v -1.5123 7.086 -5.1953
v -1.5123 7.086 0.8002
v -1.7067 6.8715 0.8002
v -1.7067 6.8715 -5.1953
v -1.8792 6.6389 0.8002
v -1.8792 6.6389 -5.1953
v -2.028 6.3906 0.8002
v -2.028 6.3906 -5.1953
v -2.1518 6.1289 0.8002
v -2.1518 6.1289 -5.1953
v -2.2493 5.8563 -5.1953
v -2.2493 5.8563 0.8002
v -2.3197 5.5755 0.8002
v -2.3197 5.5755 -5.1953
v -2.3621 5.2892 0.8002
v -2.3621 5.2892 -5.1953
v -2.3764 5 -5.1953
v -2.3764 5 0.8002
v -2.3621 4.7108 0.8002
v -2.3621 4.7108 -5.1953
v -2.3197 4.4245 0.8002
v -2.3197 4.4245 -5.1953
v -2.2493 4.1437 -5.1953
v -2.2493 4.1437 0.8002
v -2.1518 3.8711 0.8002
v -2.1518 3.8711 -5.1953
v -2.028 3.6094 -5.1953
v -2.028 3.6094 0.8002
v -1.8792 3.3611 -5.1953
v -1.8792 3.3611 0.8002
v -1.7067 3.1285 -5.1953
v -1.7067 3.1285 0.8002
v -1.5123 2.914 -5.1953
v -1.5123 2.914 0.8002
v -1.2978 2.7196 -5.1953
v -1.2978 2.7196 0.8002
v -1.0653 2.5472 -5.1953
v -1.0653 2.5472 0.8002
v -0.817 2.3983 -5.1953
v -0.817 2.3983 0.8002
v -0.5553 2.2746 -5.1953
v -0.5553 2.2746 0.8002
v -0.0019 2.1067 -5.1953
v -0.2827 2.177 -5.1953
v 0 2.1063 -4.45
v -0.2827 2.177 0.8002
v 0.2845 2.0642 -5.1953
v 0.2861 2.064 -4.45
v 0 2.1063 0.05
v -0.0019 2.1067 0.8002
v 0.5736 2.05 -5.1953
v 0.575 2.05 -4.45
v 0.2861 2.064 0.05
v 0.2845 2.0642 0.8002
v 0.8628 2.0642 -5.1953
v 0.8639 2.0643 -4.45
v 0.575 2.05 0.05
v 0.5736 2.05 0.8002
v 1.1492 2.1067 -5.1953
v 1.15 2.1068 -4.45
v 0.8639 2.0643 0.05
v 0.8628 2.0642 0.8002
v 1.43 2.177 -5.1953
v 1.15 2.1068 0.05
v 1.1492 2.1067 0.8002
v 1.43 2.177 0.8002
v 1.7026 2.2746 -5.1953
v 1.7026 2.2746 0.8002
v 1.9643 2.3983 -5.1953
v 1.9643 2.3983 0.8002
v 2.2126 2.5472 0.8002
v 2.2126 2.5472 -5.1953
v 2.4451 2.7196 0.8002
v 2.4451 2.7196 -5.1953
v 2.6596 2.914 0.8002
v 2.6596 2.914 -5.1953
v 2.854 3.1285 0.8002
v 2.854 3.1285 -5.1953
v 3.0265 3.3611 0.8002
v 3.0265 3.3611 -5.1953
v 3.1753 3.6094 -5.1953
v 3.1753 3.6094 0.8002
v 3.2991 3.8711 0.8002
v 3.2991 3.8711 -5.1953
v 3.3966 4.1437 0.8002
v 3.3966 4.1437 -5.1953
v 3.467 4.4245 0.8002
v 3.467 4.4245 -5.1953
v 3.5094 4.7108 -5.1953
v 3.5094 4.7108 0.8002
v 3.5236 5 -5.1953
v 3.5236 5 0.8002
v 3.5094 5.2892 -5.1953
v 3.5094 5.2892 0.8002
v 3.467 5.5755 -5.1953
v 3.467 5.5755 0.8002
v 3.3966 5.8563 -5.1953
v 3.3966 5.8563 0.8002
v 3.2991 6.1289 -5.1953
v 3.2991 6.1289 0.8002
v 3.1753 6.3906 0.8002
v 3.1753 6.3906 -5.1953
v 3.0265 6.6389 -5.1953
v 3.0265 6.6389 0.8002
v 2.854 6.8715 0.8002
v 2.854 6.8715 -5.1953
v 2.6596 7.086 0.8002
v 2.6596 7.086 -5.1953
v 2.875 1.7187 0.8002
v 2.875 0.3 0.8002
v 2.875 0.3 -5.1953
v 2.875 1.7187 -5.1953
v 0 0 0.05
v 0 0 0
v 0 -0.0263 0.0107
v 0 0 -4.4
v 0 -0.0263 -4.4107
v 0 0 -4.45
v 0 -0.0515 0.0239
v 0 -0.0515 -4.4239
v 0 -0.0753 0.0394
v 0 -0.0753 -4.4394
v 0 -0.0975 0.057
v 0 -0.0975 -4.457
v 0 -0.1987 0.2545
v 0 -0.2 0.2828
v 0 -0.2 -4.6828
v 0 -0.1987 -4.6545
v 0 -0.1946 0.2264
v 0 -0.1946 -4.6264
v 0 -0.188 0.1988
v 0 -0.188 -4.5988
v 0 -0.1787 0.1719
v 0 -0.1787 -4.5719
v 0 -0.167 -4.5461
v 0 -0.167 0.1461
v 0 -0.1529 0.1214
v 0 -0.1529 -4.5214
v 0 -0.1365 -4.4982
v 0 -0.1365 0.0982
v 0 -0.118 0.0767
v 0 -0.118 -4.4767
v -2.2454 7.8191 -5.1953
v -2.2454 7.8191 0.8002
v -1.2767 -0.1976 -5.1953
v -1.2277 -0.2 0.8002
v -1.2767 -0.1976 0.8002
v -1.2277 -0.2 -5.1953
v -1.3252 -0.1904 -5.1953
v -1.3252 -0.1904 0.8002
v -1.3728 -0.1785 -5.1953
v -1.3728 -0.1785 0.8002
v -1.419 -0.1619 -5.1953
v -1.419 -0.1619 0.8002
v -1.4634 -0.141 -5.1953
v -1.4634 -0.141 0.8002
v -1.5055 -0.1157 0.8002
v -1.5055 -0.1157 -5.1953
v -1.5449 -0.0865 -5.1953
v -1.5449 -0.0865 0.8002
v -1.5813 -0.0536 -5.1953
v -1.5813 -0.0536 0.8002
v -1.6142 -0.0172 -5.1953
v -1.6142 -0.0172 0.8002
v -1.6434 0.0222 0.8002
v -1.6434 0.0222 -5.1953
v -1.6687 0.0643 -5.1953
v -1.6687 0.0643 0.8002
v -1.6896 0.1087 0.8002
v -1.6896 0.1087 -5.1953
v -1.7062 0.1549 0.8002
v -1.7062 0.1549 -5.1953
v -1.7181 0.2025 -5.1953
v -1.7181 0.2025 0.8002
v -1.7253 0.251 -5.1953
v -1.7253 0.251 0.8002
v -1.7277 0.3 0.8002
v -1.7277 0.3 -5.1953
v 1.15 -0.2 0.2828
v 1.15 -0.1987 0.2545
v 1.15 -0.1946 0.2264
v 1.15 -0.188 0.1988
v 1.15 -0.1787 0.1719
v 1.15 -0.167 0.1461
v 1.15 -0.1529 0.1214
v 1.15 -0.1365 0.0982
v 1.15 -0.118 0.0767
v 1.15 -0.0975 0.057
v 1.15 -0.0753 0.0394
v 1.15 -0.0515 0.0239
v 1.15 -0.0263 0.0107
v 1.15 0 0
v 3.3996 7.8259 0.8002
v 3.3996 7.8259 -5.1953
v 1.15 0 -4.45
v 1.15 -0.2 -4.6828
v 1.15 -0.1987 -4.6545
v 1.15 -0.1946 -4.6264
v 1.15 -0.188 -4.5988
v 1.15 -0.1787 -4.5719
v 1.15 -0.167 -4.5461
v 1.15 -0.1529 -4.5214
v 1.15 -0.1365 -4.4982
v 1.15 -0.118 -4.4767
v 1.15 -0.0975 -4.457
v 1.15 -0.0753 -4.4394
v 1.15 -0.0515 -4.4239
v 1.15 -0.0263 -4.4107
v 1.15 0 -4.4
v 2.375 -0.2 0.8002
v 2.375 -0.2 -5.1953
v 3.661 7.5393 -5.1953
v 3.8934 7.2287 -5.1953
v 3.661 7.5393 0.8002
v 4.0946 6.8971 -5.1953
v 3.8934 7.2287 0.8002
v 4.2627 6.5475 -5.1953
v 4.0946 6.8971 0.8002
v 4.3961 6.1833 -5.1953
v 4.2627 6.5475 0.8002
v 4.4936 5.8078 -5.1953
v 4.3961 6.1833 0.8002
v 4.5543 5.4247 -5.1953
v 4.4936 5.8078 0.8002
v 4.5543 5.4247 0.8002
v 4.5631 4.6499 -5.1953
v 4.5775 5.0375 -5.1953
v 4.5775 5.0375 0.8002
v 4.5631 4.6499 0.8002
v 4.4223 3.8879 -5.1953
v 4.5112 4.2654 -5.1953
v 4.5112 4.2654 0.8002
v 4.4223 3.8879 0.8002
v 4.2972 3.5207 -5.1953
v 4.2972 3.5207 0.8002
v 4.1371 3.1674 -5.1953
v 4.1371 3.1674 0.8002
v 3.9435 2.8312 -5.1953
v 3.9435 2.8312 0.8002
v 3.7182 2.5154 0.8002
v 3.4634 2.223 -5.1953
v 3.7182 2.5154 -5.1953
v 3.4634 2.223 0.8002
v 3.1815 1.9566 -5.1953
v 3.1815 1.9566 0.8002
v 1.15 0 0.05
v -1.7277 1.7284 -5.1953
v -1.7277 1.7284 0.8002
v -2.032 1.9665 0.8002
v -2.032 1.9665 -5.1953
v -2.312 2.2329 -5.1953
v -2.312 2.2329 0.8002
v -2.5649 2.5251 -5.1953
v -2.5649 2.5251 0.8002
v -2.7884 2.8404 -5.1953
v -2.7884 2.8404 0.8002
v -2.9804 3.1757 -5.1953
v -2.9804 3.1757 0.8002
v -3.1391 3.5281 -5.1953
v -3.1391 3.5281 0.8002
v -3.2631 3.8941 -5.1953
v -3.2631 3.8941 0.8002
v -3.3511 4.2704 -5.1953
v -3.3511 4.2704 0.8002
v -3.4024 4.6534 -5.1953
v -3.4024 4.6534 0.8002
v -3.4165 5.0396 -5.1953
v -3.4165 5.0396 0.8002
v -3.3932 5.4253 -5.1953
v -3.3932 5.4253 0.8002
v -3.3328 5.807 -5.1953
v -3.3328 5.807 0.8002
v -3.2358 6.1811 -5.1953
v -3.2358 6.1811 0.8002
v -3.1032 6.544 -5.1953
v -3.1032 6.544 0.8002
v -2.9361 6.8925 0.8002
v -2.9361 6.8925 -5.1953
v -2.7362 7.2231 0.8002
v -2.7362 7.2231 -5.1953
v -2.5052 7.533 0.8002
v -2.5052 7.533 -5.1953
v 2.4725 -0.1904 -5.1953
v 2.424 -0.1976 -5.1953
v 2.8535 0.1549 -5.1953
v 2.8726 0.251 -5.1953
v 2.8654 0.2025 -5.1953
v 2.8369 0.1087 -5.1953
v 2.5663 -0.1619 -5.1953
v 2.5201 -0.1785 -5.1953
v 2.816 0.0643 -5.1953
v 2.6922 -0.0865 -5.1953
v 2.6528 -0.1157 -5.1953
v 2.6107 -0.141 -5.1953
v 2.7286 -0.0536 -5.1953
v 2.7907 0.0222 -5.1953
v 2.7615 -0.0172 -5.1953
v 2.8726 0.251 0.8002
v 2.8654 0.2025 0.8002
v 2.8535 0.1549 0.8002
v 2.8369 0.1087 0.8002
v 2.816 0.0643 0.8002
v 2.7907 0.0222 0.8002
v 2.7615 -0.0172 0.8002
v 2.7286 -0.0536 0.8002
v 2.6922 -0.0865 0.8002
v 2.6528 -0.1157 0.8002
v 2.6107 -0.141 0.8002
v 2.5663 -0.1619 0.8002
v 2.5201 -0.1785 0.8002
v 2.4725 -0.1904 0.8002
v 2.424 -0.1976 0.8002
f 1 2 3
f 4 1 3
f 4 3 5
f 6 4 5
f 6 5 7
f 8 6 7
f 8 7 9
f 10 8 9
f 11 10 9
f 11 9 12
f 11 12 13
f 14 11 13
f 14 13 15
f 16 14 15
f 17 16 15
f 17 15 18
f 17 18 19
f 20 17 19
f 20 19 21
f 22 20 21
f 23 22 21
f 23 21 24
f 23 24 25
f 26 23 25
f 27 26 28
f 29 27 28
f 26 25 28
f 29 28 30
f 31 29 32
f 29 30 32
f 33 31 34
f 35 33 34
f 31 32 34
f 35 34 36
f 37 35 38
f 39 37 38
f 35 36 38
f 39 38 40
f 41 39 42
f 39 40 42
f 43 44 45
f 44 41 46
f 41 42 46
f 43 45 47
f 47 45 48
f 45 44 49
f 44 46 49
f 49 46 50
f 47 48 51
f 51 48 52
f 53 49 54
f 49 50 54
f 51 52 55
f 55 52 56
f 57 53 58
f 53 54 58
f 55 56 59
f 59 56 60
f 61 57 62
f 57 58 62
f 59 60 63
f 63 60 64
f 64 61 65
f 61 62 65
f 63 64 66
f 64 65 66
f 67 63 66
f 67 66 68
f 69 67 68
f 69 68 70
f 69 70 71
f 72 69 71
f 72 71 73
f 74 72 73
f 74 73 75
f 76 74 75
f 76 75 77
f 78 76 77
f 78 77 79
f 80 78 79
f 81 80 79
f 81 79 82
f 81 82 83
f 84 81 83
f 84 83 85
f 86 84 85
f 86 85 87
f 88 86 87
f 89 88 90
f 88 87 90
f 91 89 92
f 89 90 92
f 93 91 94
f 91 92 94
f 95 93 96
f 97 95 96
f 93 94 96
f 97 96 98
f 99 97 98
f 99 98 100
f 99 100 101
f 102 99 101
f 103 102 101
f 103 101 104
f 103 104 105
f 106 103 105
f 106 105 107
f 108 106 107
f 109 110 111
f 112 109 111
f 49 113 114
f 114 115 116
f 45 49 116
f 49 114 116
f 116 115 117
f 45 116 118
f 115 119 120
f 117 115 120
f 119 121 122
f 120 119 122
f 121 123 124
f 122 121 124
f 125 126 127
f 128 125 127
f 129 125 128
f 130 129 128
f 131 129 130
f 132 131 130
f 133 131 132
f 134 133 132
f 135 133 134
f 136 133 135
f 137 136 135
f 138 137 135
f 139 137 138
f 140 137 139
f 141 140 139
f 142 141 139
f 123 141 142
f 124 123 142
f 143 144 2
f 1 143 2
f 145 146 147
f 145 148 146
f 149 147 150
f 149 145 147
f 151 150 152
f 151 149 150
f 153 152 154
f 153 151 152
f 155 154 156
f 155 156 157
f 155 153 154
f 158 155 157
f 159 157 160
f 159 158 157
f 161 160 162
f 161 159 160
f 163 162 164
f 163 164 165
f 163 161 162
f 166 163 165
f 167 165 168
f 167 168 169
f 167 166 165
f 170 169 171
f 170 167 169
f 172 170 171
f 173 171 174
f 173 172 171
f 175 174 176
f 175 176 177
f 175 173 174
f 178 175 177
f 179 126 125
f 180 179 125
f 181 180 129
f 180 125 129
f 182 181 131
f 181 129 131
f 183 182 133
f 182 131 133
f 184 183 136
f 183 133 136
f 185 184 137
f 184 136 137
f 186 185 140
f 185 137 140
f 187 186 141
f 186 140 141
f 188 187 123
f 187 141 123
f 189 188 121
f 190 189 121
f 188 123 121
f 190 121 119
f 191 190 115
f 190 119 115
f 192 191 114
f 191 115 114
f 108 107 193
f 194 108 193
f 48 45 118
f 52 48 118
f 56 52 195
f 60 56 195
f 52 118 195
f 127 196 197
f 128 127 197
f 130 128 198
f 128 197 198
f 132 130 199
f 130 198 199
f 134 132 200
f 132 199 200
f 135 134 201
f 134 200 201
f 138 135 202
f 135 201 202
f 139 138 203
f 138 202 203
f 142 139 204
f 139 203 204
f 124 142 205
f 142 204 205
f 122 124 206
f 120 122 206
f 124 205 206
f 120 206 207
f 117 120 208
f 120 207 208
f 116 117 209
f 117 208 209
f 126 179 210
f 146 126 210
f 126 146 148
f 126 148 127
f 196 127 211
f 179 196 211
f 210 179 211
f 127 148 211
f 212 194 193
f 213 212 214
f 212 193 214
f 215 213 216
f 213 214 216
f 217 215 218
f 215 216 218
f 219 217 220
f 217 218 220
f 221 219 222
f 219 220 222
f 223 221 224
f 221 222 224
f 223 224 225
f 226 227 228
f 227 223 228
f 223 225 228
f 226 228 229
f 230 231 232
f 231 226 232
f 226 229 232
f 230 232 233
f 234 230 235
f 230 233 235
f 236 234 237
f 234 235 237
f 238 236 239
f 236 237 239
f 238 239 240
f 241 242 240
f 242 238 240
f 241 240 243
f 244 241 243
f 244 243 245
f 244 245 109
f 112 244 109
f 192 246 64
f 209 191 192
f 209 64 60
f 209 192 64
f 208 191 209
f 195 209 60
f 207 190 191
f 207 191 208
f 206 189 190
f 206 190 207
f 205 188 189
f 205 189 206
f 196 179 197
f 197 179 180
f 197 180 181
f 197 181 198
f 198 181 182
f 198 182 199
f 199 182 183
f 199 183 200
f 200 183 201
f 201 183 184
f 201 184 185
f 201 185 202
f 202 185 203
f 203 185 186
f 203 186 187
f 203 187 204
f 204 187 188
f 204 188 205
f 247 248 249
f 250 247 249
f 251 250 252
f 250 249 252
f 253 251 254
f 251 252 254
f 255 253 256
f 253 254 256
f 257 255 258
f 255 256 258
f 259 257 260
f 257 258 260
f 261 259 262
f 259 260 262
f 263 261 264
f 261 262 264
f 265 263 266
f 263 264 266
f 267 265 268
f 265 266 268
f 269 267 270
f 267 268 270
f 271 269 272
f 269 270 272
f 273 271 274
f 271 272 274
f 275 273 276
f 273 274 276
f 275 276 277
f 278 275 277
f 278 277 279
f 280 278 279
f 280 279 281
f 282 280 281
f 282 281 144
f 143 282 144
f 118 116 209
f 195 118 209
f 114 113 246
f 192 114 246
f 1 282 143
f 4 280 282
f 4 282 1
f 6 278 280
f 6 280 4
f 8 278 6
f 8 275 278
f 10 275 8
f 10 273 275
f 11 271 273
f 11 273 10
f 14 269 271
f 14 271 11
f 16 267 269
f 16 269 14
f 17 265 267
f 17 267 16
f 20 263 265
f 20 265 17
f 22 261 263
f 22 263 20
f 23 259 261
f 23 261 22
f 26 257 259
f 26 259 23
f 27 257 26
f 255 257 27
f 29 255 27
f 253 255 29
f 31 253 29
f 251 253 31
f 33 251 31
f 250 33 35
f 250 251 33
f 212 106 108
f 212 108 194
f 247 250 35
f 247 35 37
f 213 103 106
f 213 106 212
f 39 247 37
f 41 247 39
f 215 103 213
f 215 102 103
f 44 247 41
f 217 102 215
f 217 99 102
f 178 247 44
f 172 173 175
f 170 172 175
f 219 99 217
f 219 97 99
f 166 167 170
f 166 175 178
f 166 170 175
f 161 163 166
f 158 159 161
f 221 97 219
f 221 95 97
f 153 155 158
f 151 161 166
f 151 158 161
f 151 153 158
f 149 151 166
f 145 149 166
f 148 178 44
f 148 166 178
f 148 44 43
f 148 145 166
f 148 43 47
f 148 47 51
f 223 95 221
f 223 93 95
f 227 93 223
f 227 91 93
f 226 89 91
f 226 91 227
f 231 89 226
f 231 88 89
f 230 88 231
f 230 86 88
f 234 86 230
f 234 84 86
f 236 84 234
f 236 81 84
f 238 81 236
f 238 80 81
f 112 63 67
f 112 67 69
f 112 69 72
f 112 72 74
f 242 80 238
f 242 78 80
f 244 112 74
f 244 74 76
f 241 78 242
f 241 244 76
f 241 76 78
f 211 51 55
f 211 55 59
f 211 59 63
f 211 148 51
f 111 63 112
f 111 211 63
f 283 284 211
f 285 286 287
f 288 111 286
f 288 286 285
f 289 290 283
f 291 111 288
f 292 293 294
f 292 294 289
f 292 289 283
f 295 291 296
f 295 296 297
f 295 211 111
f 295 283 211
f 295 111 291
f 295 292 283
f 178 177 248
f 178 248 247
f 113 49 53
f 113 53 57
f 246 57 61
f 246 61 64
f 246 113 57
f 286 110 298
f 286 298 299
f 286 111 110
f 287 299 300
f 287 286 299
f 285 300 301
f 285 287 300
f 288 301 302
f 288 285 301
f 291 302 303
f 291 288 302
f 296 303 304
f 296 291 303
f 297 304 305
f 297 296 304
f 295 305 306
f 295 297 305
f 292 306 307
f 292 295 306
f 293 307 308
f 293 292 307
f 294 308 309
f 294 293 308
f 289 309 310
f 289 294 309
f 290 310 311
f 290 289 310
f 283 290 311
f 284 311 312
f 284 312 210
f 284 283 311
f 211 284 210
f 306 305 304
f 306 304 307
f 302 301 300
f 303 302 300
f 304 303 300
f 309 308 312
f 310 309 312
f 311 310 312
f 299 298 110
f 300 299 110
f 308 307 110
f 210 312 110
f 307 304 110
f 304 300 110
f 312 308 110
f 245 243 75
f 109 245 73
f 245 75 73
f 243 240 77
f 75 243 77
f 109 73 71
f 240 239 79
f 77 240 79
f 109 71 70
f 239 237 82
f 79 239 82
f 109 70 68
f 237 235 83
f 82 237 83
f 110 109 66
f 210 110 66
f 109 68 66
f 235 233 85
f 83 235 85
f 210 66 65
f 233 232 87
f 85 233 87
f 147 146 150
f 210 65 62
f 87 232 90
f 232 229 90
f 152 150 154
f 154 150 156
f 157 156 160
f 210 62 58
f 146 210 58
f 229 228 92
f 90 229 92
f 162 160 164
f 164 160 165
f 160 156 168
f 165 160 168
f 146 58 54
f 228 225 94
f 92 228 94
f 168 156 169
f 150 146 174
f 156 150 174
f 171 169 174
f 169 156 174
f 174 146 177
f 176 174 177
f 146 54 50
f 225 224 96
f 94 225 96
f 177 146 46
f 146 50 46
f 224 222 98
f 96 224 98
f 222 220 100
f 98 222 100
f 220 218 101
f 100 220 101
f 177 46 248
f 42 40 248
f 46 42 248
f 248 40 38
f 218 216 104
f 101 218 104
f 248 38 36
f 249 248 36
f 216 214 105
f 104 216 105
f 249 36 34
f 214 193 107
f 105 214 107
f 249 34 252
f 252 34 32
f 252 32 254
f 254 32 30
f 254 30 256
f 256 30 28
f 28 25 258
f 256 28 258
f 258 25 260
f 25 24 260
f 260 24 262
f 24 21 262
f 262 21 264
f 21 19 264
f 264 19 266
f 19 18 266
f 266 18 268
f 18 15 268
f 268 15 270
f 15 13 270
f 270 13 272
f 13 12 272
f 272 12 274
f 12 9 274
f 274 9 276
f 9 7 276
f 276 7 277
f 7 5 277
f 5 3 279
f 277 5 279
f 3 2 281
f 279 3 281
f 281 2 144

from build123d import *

# Parameters (mm, degrees)
BOSS_EXTRUDE1_DEPTH      = 2
BOSS_EXTRUDE1_DEPTH_BACK = 0.2
SKETCH1_W                = 4.602701487
SKETCH1_H                = 5.995472756
SKETCH1_W_2              = 1.15
SKETCH1_H_2              = 4.4
BOSS_EXTRUDE2_REACH      = 8.943
SKETCH4_W                = 1.15
SKETCH4_H                = 4.5
CUT_EXTRUDE2_DEPTH       = 2.2
FILLET1_R                = 0.5
FILLET2_R                = 0.3


with BuildPart() as part:
    # Sketch1 → Boss-Extrude1 (new, two sides: drawn at the far end of the back side and taken through both)
    with BuildSketch(Plane(origin=(0, 0, 0), x_dir=(1, 0, 0), z_dir=(0, 1, 0)).offset(-BOSS_EXTRUDE1_DEPTH_BACK)):
        with Locations((0.573649256, 2.197554863)):
            Rectangle(SKETCH1_W, SKETCH1_H)
        with Locations((0.575, 2.2)):
            Rectangle(SKETCH1_W_2, SKETCH1_H_2, mode=Mode.SUBTRACT)
    extrude(amount=BOSS_EXTRUDE1_DEPTH + BOSS_EXTRUDE1_DEPTH_BACK)

    # Boss-Extrude2: up to this face of the body (flat: up to its plane)
    boss_extrude2_end = Plane(part.part.faces().sort_by_distance((0.573649257, 0.9, -5.195291241))[0])
    # Sketch3 → Boss-Extrude2 (add, up to the picked face)
    with BuildSketch(Plane.XY.offset(0.800181515), mode=Mode.PRIVATE) as boss_extrude2_sk1:
        with BuildLine():
            Line((-2.24541451, 7.819063766), (-1.512315748, 7.085965005))
            ThreePointArc((-1.512315748, 7.085965005), (0.573649257, 2.05), (2.659614261, 7.085965005))
            Line((2.659614261, 7.085965005), (3.399551047, 7.82590179))
            ThreePointArc((3.399551047, 7.82590179), (0.585339186, 0.994625964), (-2.24541451, 7.819063766))
        make_face()
    boss_extrude2_tool1 = split(extrude(boss_extrude2_sk1.sketch, amount=-BOSS_EXTRUDE2_REACH, mode=Mode.PRIVATE), bisect_by=boss_extrude2_end, keep=Keep.BOTH, mode=Mode.PRIVATE)
    add(boss_extrude2_tool1.solids().sort_by(Axis((-1.953222, 7.378157, 0.800182), (0, 0, -1)))[0])

    # Sketch4 → Cut-Extrude2 (cut)
    with BuildSketch(Plane.XZ):
        with Locations((0.575, -2.2)):
            Rectangle(SKETCH4_W, SKETCH4_H)
    extrude(amount=-CUT_EXTRUDE2_DEPTH, mode=Mode.SUBTRACT)

    # Fillet1
    fillet1_edges = [part.edges().sort_by_distance(p)[0] for p in [
        (-1.727701487, -0.2, -2.197554863),
        (2.875, -0.2, -2.197554863),
    ]]
    fillet(fillet1_edges, radius=FILLET1_R)

    # Fillet2
    # the kernel refuses this fillet: 0.3 mm, written as the material it takes off along each edge
    with BuildSketch(Plane(origin=(1.15, -0.2, -4.4), x_dir=(0, 0, -1), z_dir=(-1, 0, 0)), Plane(origin=(0, -0.2, 0), x_dir=(0, 0, 1), z_dir=(1, 0, 0))) as fillet2_piece_1:
        with BuildLine():
            CenterArc((0.282842712, -0.3), FILLET2_R, 90, 70.528779366)
            Line((0, -0.2), (-0.005656854, -0.198))
            ThreePointArc((-0.005656854, -0.198), (-0.006, -0.1), (-0.006, 0))
            Line((-0.006, 0), (0, 0.006))
            Line((0, 0.006), (0.282842712, 0.006))
            Line((0.282842712, 0.006), (0.282842712, 0))
        make_face()
    extrude(amount=1.15, mode=Mode.SUBTRACT)


solid = part.part
